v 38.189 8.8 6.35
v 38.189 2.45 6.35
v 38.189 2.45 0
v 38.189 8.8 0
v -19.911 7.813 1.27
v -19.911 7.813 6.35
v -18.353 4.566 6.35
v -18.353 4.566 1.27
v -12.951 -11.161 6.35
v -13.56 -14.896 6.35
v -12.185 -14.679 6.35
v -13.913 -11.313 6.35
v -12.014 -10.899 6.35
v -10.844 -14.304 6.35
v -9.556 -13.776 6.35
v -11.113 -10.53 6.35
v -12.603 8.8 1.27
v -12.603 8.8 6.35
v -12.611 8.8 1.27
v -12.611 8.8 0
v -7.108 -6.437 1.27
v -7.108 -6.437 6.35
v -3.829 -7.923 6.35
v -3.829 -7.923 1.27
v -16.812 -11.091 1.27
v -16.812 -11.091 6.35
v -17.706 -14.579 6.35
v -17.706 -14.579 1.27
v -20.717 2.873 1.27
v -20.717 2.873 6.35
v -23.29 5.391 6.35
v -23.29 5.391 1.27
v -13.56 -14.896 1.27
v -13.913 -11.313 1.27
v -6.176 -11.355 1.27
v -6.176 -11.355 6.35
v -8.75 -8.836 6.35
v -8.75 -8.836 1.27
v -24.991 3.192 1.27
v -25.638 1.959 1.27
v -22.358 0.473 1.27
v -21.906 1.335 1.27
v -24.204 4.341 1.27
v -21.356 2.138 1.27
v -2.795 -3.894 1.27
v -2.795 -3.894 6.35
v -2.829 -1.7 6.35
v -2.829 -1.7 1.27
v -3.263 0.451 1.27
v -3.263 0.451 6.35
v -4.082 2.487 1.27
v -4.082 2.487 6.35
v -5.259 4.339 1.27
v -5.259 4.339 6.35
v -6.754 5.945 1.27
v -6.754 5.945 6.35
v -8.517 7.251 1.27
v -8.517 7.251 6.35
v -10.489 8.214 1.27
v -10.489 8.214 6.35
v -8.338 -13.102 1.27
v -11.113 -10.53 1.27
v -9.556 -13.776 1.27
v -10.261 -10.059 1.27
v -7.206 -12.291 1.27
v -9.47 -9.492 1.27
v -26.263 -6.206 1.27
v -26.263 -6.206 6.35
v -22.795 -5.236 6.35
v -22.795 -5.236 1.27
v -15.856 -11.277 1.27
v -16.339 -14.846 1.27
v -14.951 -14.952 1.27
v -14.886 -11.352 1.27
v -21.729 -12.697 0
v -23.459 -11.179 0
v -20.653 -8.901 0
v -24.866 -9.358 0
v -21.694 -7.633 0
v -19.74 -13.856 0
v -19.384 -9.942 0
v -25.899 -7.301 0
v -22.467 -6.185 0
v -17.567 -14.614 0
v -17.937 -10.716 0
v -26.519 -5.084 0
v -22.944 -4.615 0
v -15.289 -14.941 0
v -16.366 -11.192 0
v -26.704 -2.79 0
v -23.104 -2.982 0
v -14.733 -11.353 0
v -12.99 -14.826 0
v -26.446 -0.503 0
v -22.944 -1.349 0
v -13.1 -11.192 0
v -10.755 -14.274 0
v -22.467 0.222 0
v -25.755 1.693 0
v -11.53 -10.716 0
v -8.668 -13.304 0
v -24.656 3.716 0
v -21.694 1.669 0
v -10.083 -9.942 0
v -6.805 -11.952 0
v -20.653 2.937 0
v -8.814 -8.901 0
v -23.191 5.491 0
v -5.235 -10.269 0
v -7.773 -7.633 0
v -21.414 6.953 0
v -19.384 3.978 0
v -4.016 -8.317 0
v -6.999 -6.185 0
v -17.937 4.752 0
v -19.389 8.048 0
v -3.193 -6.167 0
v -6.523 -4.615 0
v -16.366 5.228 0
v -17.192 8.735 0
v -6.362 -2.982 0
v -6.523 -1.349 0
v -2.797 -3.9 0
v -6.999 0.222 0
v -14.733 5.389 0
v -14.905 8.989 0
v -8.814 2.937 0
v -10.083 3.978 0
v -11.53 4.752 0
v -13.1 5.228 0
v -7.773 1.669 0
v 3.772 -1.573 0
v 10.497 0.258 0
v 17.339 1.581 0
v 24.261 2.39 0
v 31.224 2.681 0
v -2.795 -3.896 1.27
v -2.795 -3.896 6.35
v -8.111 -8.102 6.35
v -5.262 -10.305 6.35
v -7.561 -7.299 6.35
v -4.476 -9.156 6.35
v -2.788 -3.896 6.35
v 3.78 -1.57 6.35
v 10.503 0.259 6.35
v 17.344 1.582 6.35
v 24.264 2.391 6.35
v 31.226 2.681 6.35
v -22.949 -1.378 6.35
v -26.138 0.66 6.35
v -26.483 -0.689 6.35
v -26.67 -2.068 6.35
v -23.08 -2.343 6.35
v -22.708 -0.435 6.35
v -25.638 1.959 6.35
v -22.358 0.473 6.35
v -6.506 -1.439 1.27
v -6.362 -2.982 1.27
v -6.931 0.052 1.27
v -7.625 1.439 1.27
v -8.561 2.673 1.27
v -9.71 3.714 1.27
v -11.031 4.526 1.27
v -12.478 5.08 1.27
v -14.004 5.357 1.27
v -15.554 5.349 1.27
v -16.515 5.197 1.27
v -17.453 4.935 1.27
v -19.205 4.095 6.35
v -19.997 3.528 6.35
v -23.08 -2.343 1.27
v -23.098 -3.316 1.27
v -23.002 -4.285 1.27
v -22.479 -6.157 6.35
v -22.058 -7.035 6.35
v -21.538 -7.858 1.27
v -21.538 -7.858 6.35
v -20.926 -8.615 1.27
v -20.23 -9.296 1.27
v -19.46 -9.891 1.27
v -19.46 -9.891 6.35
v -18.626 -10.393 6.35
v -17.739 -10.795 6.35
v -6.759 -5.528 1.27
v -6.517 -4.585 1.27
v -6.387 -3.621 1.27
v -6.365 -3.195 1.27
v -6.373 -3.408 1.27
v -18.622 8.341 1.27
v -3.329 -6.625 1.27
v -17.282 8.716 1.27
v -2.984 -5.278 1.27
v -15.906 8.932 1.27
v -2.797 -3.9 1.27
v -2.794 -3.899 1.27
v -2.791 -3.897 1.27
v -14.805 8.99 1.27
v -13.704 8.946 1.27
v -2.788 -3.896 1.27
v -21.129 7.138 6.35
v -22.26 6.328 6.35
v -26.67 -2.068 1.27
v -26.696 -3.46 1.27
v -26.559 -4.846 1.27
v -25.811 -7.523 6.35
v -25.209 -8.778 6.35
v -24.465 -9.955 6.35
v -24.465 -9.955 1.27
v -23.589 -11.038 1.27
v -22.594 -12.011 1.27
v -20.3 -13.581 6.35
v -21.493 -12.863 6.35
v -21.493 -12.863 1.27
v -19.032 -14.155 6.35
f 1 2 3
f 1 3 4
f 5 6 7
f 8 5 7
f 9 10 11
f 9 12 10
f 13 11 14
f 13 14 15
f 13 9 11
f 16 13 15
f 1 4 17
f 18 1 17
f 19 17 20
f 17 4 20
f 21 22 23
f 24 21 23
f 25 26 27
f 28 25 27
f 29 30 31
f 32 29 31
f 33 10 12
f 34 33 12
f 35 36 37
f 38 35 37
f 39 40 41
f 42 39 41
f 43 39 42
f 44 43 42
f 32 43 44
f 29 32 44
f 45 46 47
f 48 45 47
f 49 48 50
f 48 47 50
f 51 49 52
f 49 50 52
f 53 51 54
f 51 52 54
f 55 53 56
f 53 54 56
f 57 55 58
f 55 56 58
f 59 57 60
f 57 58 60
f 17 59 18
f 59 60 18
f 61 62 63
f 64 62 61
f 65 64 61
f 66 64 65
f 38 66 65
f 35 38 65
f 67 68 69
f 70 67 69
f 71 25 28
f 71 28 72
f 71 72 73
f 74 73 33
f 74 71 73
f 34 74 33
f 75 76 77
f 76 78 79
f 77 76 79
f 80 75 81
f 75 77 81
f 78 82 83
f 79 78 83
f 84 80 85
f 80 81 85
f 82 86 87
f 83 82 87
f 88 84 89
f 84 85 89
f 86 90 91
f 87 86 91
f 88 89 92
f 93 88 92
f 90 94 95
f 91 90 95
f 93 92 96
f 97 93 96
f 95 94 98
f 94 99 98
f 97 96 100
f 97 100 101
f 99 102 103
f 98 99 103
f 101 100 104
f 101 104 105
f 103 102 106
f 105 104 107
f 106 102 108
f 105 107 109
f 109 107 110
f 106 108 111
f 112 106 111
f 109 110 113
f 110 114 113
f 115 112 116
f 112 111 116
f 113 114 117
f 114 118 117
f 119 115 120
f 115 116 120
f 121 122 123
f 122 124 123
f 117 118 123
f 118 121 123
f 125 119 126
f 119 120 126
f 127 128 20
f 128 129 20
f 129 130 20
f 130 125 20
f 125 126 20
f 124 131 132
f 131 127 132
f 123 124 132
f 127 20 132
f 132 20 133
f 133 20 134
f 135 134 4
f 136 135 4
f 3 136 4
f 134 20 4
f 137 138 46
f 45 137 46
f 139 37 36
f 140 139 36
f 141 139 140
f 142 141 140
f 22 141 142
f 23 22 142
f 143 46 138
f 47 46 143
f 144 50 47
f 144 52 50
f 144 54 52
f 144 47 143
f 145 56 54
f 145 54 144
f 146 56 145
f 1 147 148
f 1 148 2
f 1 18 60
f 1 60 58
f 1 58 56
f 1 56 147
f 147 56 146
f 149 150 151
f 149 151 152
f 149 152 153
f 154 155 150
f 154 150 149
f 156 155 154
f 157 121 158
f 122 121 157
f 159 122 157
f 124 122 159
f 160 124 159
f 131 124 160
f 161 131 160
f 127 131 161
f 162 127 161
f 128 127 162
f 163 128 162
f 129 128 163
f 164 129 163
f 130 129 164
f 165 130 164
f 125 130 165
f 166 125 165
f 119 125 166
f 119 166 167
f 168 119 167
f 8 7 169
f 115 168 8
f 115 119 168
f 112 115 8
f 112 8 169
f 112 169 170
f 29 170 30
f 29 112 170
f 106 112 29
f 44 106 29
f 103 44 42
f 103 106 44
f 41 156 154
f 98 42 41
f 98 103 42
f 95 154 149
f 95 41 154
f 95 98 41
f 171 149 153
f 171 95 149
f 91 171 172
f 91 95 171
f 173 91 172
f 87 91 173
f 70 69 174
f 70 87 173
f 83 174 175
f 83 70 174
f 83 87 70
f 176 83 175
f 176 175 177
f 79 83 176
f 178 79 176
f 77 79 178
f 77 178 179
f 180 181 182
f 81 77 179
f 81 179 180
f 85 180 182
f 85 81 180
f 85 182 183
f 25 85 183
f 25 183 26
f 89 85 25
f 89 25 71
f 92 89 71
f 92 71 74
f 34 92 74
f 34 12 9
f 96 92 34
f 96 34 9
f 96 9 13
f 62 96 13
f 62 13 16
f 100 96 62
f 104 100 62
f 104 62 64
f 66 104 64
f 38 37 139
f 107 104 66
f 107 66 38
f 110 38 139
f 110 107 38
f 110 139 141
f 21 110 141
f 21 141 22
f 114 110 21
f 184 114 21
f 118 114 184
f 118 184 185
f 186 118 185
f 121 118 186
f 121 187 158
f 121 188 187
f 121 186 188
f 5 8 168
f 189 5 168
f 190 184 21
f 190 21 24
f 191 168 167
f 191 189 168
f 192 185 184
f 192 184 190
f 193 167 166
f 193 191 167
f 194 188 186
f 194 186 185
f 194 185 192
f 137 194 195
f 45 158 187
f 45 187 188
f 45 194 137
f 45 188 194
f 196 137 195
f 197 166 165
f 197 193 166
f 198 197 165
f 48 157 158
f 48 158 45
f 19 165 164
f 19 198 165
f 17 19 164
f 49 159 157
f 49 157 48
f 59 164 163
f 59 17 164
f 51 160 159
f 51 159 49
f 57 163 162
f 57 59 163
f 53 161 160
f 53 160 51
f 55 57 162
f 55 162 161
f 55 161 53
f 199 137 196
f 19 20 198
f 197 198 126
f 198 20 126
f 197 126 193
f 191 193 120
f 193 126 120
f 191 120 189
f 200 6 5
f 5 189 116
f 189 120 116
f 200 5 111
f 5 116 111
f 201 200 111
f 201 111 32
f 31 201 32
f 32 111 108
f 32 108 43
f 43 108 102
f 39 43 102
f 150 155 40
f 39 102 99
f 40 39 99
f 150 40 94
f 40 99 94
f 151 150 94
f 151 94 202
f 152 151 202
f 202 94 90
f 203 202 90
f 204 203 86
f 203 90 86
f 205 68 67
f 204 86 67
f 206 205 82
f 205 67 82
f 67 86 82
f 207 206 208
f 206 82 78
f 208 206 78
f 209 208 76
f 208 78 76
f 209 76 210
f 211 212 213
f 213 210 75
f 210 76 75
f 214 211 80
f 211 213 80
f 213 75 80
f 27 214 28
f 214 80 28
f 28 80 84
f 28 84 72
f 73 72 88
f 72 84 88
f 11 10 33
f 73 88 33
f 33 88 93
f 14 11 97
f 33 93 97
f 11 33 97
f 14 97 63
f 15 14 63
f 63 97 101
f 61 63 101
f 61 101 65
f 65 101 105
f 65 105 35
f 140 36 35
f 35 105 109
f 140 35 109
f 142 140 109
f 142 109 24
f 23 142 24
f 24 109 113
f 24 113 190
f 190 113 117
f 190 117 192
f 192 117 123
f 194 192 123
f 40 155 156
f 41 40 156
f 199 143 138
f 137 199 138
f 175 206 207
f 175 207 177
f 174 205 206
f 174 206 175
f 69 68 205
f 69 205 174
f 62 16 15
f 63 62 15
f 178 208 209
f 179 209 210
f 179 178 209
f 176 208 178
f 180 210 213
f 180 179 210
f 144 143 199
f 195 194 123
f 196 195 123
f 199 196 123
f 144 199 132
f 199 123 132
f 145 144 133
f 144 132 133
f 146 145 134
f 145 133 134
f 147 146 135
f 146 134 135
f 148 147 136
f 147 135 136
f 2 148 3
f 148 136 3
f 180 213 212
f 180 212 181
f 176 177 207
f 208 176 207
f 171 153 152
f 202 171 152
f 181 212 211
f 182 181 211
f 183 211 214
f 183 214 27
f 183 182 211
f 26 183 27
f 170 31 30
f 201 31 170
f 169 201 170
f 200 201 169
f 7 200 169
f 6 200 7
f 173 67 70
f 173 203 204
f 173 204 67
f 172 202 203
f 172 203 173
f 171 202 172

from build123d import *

# Parameters (mm, degrees)
F0_R     = 8.371120517
F1_DEPTH = 6.35
F4_DEPTH = 5.08
F6_DEPTH = 5.08


with BuildPart() as f1:
    # F0 (on Top) → F1 (new body)
    with BuildSketch(Plane.XY):
        with BuildLine():
            Line((38.1892591841, 8.8001990686), (-12.6107408159, 8.8001990686))
            ThreePointArc((-12.6107408159, 8.8001990686), (-24.206336891, -10.3022339435), (-2.7967678425, -3.8998009314))
            ThreePointArc((-2.7967678425, -3.8998009314), (17.3389637973, 1.581272222), (38.1892591841, 2.4501990686))
            Line((38.1892591841, 2.4501990686), (38.1892591841, 8.8001990686))
        make_face()
        with Locations((-14.7333428902, -2.9819420458)):
            Circle(F0_R, mode=Mode.SUBTRACT)
    extrude(amount=F1_DEPTH)

    # F3 (on face) → F4 (cut)
    with BuildSketch(Plane.XY.offset(6.35)):
        with BuildLine():
            Line((-13.560262228, -14.8961424203), (-13.9130828172, -11.3127782657))
            ThreePointArc((-13.9130828172, -11.3127782657), (-15.3721789388, -11.3286508112), (-16.8118643504, -11.0909128344))
            Line((-16.8118643504, -11.0909128344), (-17.7059041681, -14.5788454365))
            ThreePointArc((-17.7059041681, -14.5788454365), (-15.6469631426, -14.9188422648), (-13.560262228, -14.8961424203))
        make_face()
        with BuildLine():
            Line((-6.1764105875, -11.3547073221), (-8.7500289189, -8.8364798269))
            ThreePointArc((-8.7500289189, -8.8364798269), (-9.8575587193, -9.7865278105), (-11.1132367545, -10.5298218989))
            Line((-11.1132367545, -10.5298218989), (-9.5561111287, -13.7764110041))
            ThreePointArc((-9.5561111287, -13.7764110041), (-7.7603250488, -12.7134019048), (-6.1764105875, -11.3547073221))
        make_face()
        with BuildLine():
            Line((-2.7877611159, -3.8962267625), (-6.3866341249, -3.6207780944))
            ThreePointArc((-6.3866341249, -3.6207780944), (-6.6243721016, -5.060463506), (-7.1084970525, -6.4369940948))
            Line((-7.1084970525, -6.4369940948), (-3.828802369, -7.9231245789))
            ThreePointArc((-3.828802369, -7.9231245789), (-3.1369674478, -5.9565622573), (-2.7967678425, -3.8998009314))
            ThreePointArc((-2.7967678425, -3.8998009314), (-2.7922645256, -3.89801373), (-2.7877611159, -3.8962267625))
        make_face()
        with BuildLine():
            Line((-21.4930113477, -12.8627907518), (-19.4599455199, -9.8909858503))
            ThreePointArc((-19.4599455199, -9.8909858503), (-20.5878806714, -8.9652560172), (-21.5379286549, -7.8577262167))
            Line((-21.5379286549, -7.8577262167), (-24.4648027493, -9.9549598872))
            ThreePointArc((-24.4648027493, -9.9549598872), (-23.1061081665, -11.5388743485), (-21.4930113477, -12.8627907518))
        make_face()
        with BuildLine():
            Line((-26.2628364708, -6.2060801603), (-22.7951783218, -5.2363750533))
            ThreePointArc((-22.7951783218, -5.2363750533), (-23.0641791102, -3.8022021189), (-23.0800516556, -2.3431059972))
            Line((-23.0800516556, -2.3431059972), (-26.6702431093, -2.0683217935))
            ThreePointArc((-26.6702431093, -2.0683217935), (-26.6475432648, -4.155022708), (-26.2628364708, -6.2060801603))
        make_face()
        with BuildLine():
            ThreePointArc((-22.358188728, 0.4731100032), (-21.6423866947, 1.7446605838), (-20.7166568616, 2.8725957353))
            Line((-20.7166568616, 2.8725957353), (-23.2902751929, 5.3908232305))
            ThreePointArc((-23.2902751929, 5.3908232305), (-24.6141915962, 3.7777264117), (-25.6378834115, 1.9592404873))
            Line((-25.6378834115, 1.9592404873), (-22.358188728, 0.4731100032))
        make_face()
        with BuildLine():
            ThreePointArc((-18.353449026, 4.5659378073), (-16.9877758977, 5.0798933858), (-15.5536029633, 5.3488941741))
            Line((-15.5536029633, 5.3488941741), (-15.9064235525, 8.9322583287))
            ThreePointArc((-15.9064235525, 8.9322583287), (-17.9574810047, 8.5475515347), (-19.9105746518, 7.8125269125))
            Line((-19.9105746518, 7.8125269125), (-18.353449026, 4.5659378073))
        make_face()
    extrude(amount=-F4_DEPTH, mode=Mode.SUBTRACT)

    # F5 (on face) → F6 (cut)
    with BuildSketch(Plane.XY.offset(6.35)):
        with BuildLine():
            ThreePointArc((-15.4898996277, 5.2621371657), (-8.9244307049, 2.9166814686), (-6.4786379033, -3.6120735562))
            Line((-6.4786379033, -3.6120735562), (-6.4786379033, -3.865575185))
            Line((-6.4786379033, -3.865575185), (-2.7950332078, -4.1475090028))
            Line((-2.7950332078, -4.1475090028), (-2.7950332078, -3.894007374))
            ThreePointArc((-2.7950332078, -3.894007374), (-6.3406722718, 5.5572722698), (-15.8519057587, 8.9387927615))
            Line((-15.8519057587, 8.9387927615), (-16.2552728318, 8.8990769519))
            Line((-16.2552728318, 8.8990769519), (-15.8971771478, 5.2621371657))
            Line((-15.8971771478, 5.2621371657), (-15.4898996277, 5.2621371657))
        make_face()
    extrude(amount=-F6_DEPTH, mode=Mode.SUBTRACT)


solid = f1.part
